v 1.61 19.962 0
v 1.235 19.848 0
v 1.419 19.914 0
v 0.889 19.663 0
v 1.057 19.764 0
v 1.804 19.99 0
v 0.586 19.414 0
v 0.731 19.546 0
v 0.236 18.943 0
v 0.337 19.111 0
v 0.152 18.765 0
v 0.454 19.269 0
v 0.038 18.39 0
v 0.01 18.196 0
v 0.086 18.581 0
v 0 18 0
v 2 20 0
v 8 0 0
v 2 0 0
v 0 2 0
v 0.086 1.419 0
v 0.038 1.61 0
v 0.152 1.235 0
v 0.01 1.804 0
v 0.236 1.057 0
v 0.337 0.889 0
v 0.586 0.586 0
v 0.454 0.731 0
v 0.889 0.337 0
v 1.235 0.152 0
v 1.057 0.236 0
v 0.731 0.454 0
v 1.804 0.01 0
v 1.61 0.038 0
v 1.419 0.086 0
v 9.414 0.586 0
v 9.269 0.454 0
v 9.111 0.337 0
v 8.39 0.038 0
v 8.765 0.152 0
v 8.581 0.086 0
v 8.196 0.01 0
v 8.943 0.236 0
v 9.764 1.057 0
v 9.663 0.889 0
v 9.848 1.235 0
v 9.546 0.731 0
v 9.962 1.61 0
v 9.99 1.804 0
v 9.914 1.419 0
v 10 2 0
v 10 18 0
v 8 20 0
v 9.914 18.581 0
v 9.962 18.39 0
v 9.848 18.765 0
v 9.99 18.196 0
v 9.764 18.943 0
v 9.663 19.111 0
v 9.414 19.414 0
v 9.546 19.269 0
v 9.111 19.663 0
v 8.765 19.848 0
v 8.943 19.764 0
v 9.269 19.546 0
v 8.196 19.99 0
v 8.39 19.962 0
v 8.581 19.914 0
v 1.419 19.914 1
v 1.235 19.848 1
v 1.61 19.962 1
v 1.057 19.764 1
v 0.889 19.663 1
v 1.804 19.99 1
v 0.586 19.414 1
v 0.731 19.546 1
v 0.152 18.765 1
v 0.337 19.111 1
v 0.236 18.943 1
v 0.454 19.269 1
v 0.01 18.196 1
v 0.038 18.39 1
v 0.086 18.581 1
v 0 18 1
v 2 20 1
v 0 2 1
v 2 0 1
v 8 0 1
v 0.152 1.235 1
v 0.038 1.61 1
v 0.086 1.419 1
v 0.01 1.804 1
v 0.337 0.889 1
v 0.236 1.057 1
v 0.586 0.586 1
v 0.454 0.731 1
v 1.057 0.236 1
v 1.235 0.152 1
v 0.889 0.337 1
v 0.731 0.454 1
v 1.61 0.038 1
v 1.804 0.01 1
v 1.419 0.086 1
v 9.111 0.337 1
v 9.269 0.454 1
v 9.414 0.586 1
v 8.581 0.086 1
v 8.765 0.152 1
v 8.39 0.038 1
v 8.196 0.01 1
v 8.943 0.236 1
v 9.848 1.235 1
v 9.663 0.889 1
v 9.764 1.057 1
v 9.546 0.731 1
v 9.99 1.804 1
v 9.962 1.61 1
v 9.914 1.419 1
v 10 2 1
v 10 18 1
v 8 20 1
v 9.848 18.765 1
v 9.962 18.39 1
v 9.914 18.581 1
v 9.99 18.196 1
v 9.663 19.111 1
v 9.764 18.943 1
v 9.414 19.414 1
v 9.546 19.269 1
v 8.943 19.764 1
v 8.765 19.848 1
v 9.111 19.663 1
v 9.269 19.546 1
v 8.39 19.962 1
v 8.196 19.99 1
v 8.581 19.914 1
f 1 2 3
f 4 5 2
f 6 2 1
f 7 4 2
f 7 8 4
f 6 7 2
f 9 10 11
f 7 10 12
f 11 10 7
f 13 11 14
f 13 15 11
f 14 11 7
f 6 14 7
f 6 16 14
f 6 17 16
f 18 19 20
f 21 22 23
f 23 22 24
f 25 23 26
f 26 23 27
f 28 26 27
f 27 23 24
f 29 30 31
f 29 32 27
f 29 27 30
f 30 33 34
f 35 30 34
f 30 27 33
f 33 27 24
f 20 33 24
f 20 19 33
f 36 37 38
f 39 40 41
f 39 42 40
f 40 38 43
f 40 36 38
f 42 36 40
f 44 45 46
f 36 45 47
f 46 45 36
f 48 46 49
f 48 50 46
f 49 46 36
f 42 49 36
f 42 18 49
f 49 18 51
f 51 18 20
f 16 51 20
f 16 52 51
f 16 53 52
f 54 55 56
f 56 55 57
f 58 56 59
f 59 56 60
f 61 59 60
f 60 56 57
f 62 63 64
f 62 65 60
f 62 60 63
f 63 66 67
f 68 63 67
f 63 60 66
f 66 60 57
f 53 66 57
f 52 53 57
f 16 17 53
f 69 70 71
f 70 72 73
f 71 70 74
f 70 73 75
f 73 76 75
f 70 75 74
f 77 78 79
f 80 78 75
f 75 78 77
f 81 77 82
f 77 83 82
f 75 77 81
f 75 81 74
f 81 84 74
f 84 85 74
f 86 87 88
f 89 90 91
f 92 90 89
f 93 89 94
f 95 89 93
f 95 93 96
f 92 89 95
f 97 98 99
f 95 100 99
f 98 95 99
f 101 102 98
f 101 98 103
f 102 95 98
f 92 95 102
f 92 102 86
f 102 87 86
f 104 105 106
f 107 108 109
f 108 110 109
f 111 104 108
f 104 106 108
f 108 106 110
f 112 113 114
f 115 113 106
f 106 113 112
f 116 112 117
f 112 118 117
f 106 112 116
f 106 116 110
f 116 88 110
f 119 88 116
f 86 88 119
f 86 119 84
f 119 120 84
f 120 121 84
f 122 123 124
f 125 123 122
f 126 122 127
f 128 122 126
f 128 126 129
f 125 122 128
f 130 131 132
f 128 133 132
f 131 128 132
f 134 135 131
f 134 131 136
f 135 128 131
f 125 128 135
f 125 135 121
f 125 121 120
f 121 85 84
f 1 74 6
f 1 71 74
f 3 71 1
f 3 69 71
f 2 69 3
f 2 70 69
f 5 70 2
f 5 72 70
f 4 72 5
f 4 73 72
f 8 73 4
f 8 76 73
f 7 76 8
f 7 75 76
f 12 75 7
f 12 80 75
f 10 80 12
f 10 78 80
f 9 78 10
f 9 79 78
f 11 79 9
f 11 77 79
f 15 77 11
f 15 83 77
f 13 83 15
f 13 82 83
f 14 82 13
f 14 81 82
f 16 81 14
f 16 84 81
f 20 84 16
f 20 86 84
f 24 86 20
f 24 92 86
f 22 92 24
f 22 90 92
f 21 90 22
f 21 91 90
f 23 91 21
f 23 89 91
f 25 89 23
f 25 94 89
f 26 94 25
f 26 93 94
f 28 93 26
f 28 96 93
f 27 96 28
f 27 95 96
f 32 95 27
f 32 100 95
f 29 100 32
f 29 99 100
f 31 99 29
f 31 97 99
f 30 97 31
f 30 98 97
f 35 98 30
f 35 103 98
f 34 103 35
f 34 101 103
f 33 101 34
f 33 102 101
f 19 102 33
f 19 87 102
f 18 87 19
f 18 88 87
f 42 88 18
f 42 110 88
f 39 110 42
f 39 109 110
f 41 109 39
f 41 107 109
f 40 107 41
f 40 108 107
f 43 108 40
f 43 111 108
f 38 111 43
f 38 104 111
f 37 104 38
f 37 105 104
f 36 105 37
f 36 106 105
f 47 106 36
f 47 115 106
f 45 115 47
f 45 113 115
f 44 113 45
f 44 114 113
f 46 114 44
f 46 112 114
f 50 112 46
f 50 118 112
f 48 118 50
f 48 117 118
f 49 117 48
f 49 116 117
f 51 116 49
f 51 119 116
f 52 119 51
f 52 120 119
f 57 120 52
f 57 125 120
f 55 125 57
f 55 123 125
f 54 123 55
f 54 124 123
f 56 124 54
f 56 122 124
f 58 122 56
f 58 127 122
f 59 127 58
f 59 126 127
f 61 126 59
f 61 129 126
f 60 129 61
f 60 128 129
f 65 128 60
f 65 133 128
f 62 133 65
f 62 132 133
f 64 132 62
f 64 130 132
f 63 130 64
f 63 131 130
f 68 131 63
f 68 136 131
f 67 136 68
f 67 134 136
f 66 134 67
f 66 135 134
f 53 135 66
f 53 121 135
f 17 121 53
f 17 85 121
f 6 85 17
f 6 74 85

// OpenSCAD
$fn = 64;

linear_extrude(0, 0, 1) roundedRect(10, 20, 2, center = false);

module roundedRect(w, h, r, center = true) {
    translate([center ? 0 : (w/2), center ? 0 : (h/2), 0]) {
        square([w - 2 * r, h], center = true);
        square([w, h - 2 * r], center = true);
        translate([w/2 - r, h/2 - r, 0]) circle(r = r);
        translate([-(w/2 - r), h/2 - r, 0]) circle(r = r);
        translate([w/2 - r, -(h/2 - r), 0]) circle(r = r);
        translate([-(w/2 - r), -(h/2 - r), 0]) circle(r = r);
    }
}
